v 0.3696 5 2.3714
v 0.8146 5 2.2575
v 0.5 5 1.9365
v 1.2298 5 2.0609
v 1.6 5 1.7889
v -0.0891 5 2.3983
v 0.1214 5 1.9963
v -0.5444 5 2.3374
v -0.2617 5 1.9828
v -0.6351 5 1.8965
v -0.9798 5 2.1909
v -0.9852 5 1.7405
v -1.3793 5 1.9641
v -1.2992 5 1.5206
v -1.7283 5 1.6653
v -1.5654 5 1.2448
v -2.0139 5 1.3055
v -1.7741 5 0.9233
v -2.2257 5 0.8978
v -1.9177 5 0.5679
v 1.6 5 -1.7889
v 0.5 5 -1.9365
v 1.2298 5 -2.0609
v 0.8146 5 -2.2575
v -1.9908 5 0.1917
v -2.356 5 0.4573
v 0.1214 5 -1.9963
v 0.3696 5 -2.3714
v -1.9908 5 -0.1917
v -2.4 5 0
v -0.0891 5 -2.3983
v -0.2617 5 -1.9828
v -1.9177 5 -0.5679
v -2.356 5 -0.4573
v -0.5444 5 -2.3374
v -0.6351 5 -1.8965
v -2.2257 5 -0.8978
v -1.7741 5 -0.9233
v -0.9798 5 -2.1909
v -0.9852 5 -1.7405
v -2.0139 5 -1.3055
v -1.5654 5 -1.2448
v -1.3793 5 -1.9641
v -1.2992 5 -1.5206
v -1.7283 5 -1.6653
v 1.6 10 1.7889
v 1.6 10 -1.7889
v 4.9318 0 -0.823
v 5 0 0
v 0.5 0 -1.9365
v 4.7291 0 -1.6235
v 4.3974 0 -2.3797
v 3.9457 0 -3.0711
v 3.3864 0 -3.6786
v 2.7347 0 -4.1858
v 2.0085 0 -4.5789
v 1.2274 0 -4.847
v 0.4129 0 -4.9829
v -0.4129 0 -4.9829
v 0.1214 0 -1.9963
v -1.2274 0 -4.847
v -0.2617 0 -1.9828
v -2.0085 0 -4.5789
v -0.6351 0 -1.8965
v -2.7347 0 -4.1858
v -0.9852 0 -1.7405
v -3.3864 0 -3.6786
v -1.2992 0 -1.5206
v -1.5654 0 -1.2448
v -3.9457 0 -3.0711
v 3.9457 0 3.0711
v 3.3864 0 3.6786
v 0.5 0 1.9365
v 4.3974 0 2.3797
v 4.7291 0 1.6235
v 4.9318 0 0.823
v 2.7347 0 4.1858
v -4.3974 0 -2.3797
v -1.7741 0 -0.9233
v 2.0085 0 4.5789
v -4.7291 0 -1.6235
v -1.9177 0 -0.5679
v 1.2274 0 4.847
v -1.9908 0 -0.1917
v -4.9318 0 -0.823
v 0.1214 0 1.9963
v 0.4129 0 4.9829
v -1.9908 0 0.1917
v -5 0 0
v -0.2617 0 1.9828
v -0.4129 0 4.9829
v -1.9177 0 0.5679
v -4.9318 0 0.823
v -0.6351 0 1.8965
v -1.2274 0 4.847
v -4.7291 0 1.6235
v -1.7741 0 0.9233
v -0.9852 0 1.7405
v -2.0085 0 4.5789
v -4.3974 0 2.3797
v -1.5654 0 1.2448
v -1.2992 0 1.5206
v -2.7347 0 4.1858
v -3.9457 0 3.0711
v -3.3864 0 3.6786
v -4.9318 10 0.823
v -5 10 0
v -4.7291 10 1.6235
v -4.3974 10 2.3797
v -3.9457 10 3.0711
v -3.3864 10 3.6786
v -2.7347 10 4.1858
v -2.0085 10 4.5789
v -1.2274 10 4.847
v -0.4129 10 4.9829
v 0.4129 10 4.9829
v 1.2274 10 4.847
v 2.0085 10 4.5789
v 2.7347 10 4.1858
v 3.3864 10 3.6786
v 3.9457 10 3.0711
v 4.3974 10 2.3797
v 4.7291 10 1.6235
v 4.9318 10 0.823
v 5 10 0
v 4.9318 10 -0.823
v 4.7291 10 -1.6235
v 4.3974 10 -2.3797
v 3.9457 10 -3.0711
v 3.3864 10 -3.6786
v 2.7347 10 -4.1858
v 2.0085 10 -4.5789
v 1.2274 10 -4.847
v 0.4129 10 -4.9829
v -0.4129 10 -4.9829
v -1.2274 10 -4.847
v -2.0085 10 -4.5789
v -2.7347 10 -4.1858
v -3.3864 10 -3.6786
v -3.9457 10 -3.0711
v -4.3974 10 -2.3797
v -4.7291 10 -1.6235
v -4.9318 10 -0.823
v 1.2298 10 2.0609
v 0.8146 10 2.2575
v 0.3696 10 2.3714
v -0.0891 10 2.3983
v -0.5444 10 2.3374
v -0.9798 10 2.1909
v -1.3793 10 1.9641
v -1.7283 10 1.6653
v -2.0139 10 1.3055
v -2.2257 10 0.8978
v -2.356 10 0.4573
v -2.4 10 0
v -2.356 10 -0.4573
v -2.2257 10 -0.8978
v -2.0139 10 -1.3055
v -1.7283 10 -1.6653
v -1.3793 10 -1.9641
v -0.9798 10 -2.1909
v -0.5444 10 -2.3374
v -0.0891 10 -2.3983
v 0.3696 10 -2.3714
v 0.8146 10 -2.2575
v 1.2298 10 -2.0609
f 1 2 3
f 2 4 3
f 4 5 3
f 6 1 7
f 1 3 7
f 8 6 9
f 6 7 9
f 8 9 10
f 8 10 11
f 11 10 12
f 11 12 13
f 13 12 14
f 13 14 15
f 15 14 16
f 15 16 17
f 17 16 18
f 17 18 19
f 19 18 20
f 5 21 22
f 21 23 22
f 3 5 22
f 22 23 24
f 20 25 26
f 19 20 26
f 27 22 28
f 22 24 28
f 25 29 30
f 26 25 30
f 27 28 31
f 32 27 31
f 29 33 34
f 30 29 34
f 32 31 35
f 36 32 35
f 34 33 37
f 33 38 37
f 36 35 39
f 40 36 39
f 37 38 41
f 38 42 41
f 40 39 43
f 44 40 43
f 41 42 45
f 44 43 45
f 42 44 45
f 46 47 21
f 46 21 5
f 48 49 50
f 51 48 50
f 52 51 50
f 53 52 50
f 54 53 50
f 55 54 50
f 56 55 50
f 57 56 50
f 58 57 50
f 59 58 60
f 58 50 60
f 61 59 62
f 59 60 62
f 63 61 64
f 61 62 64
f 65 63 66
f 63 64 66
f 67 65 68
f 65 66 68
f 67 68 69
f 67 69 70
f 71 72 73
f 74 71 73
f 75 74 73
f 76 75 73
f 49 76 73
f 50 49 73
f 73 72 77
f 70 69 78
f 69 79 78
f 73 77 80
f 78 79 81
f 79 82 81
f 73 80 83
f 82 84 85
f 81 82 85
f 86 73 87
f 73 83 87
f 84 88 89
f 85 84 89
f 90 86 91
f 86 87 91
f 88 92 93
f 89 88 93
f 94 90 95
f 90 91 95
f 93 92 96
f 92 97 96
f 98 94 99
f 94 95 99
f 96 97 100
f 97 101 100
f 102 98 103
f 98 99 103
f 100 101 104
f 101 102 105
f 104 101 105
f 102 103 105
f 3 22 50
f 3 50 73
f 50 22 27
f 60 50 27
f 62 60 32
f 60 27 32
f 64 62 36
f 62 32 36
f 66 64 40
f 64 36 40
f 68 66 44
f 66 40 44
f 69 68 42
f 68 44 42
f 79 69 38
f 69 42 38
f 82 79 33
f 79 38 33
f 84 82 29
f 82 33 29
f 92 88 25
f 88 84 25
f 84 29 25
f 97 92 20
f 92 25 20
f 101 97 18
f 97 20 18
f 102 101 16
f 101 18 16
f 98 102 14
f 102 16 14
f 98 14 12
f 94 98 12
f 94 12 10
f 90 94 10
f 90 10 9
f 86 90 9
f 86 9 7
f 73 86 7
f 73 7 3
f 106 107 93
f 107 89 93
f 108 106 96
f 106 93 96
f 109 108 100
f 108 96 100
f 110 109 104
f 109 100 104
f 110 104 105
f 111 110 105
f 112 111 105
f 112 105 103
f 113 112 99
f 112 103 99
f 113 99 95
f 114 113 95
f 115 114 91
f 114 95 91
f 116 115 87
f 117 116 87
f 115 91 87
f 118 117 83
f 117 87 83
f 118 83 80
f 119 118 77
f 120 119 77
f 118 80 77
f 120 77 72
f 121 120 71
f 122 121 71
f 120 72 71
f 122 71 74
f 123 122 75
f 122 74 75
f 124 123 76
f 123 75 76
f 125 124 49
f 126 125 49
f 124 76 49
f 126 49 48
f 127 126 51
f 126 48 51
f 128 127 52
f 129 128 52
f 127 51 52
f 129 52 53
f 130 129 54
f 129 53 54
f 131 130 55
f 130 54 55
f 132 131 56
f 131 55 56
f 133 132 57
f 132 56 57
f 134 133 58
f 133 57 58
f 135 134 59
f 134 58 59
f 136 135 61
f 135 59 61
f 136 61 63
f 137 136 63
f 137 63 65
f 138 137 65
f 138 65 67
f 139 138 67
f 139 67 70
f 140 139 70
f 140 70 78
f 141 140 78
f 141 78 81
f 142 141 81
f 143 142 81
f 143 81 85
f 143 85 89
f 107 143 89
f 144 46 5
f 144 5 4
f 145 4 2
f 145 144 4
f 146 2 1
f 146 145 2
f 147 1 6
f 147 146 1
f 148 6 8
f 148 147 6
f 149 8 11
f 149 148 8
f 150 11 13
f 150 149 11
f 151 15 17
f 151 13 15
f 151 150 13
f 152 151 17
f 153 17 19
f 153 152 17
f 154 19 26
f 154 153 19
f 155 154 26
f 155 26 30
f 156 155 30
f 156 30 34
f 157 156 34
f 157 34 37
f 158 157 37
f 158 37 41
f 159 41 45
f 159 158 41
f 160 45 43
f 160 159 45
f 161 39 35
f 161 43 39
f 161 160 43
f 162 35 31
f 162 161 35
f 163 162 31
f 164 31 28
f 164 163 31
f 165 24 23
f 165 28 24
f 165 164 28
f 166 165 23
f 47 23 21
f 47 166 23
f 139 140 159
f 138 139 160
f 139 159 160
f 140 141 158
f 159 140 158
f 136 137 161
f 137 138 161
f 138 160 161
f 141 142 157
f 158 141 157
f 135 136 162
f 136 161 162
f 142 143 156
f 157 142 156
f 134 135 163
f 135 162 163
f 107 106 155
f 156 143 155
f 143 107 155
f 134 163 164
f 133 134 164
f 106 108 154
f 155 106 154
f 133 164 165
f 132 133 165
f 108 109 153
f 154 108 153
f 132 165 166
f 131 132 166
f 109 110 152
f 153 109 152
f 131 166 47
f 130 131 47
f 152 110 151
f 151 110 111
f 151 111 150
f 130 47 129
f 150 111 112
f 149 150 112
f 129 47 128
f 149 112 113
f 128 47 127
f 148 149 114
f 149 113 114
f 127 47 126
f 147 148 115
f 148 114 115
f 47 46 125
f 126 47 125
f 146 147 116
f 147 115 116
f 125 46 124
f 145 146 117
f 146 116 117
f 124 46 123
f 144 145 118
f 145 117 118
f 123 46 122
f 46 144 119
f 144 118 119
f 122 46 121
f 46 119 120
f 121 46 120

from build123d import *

# Parameters (mm, degrees)
CORTE_EXTRUS_O1_DEPTH    = 5
ESBO_O3_W                = 2.513225657
ESBO_O3_H                = 5.478331089
RESSALTO_EXTRUS_O1_DEPTH = 5


with BuildPart() as part:
    # Esboço1 → Revolução1 (revolve)
    with BuildSketch(Plane.XY):
        Polygon((-1, 10), (-5, 10), (-5, 0), (-2, 0), (-2, 5), (-1, 5), align=None)
    revolve(axis=Axis((0, 0, 0), (0, 1, 0)))

    # Esboço2 → Corte-extrusão1 (cut)
    with BuildSketch(Plane(origin=(0, 10, 0), x_dir=(1, 0, 0), z_dir=(0, 1, 0))):
        with BuildLine():
            Line((1.6, 1.788854382), (1.6, -1.788854382))
            ThreePointArc((1.6, -1.788854382), (-2.4, 0), (1.6, 1.788854382))
        make_face()
    extrude(amount=-CORTE_EXTRUS_O1_DEPTH, mode=Mode.SUBTRACT)

    # Esboço3 → Ressalto-extrusão1 (add)
    with BuildSketch(Plane.XZ):
        with Locations((1.756612829, -0.034046623)):
            Rectangle(ESBO_O3_W, ESBO_O3_H)
    extrude(amount=-RESSALTO_EXTRUS_O1_DEPTH)


solid = part.part
